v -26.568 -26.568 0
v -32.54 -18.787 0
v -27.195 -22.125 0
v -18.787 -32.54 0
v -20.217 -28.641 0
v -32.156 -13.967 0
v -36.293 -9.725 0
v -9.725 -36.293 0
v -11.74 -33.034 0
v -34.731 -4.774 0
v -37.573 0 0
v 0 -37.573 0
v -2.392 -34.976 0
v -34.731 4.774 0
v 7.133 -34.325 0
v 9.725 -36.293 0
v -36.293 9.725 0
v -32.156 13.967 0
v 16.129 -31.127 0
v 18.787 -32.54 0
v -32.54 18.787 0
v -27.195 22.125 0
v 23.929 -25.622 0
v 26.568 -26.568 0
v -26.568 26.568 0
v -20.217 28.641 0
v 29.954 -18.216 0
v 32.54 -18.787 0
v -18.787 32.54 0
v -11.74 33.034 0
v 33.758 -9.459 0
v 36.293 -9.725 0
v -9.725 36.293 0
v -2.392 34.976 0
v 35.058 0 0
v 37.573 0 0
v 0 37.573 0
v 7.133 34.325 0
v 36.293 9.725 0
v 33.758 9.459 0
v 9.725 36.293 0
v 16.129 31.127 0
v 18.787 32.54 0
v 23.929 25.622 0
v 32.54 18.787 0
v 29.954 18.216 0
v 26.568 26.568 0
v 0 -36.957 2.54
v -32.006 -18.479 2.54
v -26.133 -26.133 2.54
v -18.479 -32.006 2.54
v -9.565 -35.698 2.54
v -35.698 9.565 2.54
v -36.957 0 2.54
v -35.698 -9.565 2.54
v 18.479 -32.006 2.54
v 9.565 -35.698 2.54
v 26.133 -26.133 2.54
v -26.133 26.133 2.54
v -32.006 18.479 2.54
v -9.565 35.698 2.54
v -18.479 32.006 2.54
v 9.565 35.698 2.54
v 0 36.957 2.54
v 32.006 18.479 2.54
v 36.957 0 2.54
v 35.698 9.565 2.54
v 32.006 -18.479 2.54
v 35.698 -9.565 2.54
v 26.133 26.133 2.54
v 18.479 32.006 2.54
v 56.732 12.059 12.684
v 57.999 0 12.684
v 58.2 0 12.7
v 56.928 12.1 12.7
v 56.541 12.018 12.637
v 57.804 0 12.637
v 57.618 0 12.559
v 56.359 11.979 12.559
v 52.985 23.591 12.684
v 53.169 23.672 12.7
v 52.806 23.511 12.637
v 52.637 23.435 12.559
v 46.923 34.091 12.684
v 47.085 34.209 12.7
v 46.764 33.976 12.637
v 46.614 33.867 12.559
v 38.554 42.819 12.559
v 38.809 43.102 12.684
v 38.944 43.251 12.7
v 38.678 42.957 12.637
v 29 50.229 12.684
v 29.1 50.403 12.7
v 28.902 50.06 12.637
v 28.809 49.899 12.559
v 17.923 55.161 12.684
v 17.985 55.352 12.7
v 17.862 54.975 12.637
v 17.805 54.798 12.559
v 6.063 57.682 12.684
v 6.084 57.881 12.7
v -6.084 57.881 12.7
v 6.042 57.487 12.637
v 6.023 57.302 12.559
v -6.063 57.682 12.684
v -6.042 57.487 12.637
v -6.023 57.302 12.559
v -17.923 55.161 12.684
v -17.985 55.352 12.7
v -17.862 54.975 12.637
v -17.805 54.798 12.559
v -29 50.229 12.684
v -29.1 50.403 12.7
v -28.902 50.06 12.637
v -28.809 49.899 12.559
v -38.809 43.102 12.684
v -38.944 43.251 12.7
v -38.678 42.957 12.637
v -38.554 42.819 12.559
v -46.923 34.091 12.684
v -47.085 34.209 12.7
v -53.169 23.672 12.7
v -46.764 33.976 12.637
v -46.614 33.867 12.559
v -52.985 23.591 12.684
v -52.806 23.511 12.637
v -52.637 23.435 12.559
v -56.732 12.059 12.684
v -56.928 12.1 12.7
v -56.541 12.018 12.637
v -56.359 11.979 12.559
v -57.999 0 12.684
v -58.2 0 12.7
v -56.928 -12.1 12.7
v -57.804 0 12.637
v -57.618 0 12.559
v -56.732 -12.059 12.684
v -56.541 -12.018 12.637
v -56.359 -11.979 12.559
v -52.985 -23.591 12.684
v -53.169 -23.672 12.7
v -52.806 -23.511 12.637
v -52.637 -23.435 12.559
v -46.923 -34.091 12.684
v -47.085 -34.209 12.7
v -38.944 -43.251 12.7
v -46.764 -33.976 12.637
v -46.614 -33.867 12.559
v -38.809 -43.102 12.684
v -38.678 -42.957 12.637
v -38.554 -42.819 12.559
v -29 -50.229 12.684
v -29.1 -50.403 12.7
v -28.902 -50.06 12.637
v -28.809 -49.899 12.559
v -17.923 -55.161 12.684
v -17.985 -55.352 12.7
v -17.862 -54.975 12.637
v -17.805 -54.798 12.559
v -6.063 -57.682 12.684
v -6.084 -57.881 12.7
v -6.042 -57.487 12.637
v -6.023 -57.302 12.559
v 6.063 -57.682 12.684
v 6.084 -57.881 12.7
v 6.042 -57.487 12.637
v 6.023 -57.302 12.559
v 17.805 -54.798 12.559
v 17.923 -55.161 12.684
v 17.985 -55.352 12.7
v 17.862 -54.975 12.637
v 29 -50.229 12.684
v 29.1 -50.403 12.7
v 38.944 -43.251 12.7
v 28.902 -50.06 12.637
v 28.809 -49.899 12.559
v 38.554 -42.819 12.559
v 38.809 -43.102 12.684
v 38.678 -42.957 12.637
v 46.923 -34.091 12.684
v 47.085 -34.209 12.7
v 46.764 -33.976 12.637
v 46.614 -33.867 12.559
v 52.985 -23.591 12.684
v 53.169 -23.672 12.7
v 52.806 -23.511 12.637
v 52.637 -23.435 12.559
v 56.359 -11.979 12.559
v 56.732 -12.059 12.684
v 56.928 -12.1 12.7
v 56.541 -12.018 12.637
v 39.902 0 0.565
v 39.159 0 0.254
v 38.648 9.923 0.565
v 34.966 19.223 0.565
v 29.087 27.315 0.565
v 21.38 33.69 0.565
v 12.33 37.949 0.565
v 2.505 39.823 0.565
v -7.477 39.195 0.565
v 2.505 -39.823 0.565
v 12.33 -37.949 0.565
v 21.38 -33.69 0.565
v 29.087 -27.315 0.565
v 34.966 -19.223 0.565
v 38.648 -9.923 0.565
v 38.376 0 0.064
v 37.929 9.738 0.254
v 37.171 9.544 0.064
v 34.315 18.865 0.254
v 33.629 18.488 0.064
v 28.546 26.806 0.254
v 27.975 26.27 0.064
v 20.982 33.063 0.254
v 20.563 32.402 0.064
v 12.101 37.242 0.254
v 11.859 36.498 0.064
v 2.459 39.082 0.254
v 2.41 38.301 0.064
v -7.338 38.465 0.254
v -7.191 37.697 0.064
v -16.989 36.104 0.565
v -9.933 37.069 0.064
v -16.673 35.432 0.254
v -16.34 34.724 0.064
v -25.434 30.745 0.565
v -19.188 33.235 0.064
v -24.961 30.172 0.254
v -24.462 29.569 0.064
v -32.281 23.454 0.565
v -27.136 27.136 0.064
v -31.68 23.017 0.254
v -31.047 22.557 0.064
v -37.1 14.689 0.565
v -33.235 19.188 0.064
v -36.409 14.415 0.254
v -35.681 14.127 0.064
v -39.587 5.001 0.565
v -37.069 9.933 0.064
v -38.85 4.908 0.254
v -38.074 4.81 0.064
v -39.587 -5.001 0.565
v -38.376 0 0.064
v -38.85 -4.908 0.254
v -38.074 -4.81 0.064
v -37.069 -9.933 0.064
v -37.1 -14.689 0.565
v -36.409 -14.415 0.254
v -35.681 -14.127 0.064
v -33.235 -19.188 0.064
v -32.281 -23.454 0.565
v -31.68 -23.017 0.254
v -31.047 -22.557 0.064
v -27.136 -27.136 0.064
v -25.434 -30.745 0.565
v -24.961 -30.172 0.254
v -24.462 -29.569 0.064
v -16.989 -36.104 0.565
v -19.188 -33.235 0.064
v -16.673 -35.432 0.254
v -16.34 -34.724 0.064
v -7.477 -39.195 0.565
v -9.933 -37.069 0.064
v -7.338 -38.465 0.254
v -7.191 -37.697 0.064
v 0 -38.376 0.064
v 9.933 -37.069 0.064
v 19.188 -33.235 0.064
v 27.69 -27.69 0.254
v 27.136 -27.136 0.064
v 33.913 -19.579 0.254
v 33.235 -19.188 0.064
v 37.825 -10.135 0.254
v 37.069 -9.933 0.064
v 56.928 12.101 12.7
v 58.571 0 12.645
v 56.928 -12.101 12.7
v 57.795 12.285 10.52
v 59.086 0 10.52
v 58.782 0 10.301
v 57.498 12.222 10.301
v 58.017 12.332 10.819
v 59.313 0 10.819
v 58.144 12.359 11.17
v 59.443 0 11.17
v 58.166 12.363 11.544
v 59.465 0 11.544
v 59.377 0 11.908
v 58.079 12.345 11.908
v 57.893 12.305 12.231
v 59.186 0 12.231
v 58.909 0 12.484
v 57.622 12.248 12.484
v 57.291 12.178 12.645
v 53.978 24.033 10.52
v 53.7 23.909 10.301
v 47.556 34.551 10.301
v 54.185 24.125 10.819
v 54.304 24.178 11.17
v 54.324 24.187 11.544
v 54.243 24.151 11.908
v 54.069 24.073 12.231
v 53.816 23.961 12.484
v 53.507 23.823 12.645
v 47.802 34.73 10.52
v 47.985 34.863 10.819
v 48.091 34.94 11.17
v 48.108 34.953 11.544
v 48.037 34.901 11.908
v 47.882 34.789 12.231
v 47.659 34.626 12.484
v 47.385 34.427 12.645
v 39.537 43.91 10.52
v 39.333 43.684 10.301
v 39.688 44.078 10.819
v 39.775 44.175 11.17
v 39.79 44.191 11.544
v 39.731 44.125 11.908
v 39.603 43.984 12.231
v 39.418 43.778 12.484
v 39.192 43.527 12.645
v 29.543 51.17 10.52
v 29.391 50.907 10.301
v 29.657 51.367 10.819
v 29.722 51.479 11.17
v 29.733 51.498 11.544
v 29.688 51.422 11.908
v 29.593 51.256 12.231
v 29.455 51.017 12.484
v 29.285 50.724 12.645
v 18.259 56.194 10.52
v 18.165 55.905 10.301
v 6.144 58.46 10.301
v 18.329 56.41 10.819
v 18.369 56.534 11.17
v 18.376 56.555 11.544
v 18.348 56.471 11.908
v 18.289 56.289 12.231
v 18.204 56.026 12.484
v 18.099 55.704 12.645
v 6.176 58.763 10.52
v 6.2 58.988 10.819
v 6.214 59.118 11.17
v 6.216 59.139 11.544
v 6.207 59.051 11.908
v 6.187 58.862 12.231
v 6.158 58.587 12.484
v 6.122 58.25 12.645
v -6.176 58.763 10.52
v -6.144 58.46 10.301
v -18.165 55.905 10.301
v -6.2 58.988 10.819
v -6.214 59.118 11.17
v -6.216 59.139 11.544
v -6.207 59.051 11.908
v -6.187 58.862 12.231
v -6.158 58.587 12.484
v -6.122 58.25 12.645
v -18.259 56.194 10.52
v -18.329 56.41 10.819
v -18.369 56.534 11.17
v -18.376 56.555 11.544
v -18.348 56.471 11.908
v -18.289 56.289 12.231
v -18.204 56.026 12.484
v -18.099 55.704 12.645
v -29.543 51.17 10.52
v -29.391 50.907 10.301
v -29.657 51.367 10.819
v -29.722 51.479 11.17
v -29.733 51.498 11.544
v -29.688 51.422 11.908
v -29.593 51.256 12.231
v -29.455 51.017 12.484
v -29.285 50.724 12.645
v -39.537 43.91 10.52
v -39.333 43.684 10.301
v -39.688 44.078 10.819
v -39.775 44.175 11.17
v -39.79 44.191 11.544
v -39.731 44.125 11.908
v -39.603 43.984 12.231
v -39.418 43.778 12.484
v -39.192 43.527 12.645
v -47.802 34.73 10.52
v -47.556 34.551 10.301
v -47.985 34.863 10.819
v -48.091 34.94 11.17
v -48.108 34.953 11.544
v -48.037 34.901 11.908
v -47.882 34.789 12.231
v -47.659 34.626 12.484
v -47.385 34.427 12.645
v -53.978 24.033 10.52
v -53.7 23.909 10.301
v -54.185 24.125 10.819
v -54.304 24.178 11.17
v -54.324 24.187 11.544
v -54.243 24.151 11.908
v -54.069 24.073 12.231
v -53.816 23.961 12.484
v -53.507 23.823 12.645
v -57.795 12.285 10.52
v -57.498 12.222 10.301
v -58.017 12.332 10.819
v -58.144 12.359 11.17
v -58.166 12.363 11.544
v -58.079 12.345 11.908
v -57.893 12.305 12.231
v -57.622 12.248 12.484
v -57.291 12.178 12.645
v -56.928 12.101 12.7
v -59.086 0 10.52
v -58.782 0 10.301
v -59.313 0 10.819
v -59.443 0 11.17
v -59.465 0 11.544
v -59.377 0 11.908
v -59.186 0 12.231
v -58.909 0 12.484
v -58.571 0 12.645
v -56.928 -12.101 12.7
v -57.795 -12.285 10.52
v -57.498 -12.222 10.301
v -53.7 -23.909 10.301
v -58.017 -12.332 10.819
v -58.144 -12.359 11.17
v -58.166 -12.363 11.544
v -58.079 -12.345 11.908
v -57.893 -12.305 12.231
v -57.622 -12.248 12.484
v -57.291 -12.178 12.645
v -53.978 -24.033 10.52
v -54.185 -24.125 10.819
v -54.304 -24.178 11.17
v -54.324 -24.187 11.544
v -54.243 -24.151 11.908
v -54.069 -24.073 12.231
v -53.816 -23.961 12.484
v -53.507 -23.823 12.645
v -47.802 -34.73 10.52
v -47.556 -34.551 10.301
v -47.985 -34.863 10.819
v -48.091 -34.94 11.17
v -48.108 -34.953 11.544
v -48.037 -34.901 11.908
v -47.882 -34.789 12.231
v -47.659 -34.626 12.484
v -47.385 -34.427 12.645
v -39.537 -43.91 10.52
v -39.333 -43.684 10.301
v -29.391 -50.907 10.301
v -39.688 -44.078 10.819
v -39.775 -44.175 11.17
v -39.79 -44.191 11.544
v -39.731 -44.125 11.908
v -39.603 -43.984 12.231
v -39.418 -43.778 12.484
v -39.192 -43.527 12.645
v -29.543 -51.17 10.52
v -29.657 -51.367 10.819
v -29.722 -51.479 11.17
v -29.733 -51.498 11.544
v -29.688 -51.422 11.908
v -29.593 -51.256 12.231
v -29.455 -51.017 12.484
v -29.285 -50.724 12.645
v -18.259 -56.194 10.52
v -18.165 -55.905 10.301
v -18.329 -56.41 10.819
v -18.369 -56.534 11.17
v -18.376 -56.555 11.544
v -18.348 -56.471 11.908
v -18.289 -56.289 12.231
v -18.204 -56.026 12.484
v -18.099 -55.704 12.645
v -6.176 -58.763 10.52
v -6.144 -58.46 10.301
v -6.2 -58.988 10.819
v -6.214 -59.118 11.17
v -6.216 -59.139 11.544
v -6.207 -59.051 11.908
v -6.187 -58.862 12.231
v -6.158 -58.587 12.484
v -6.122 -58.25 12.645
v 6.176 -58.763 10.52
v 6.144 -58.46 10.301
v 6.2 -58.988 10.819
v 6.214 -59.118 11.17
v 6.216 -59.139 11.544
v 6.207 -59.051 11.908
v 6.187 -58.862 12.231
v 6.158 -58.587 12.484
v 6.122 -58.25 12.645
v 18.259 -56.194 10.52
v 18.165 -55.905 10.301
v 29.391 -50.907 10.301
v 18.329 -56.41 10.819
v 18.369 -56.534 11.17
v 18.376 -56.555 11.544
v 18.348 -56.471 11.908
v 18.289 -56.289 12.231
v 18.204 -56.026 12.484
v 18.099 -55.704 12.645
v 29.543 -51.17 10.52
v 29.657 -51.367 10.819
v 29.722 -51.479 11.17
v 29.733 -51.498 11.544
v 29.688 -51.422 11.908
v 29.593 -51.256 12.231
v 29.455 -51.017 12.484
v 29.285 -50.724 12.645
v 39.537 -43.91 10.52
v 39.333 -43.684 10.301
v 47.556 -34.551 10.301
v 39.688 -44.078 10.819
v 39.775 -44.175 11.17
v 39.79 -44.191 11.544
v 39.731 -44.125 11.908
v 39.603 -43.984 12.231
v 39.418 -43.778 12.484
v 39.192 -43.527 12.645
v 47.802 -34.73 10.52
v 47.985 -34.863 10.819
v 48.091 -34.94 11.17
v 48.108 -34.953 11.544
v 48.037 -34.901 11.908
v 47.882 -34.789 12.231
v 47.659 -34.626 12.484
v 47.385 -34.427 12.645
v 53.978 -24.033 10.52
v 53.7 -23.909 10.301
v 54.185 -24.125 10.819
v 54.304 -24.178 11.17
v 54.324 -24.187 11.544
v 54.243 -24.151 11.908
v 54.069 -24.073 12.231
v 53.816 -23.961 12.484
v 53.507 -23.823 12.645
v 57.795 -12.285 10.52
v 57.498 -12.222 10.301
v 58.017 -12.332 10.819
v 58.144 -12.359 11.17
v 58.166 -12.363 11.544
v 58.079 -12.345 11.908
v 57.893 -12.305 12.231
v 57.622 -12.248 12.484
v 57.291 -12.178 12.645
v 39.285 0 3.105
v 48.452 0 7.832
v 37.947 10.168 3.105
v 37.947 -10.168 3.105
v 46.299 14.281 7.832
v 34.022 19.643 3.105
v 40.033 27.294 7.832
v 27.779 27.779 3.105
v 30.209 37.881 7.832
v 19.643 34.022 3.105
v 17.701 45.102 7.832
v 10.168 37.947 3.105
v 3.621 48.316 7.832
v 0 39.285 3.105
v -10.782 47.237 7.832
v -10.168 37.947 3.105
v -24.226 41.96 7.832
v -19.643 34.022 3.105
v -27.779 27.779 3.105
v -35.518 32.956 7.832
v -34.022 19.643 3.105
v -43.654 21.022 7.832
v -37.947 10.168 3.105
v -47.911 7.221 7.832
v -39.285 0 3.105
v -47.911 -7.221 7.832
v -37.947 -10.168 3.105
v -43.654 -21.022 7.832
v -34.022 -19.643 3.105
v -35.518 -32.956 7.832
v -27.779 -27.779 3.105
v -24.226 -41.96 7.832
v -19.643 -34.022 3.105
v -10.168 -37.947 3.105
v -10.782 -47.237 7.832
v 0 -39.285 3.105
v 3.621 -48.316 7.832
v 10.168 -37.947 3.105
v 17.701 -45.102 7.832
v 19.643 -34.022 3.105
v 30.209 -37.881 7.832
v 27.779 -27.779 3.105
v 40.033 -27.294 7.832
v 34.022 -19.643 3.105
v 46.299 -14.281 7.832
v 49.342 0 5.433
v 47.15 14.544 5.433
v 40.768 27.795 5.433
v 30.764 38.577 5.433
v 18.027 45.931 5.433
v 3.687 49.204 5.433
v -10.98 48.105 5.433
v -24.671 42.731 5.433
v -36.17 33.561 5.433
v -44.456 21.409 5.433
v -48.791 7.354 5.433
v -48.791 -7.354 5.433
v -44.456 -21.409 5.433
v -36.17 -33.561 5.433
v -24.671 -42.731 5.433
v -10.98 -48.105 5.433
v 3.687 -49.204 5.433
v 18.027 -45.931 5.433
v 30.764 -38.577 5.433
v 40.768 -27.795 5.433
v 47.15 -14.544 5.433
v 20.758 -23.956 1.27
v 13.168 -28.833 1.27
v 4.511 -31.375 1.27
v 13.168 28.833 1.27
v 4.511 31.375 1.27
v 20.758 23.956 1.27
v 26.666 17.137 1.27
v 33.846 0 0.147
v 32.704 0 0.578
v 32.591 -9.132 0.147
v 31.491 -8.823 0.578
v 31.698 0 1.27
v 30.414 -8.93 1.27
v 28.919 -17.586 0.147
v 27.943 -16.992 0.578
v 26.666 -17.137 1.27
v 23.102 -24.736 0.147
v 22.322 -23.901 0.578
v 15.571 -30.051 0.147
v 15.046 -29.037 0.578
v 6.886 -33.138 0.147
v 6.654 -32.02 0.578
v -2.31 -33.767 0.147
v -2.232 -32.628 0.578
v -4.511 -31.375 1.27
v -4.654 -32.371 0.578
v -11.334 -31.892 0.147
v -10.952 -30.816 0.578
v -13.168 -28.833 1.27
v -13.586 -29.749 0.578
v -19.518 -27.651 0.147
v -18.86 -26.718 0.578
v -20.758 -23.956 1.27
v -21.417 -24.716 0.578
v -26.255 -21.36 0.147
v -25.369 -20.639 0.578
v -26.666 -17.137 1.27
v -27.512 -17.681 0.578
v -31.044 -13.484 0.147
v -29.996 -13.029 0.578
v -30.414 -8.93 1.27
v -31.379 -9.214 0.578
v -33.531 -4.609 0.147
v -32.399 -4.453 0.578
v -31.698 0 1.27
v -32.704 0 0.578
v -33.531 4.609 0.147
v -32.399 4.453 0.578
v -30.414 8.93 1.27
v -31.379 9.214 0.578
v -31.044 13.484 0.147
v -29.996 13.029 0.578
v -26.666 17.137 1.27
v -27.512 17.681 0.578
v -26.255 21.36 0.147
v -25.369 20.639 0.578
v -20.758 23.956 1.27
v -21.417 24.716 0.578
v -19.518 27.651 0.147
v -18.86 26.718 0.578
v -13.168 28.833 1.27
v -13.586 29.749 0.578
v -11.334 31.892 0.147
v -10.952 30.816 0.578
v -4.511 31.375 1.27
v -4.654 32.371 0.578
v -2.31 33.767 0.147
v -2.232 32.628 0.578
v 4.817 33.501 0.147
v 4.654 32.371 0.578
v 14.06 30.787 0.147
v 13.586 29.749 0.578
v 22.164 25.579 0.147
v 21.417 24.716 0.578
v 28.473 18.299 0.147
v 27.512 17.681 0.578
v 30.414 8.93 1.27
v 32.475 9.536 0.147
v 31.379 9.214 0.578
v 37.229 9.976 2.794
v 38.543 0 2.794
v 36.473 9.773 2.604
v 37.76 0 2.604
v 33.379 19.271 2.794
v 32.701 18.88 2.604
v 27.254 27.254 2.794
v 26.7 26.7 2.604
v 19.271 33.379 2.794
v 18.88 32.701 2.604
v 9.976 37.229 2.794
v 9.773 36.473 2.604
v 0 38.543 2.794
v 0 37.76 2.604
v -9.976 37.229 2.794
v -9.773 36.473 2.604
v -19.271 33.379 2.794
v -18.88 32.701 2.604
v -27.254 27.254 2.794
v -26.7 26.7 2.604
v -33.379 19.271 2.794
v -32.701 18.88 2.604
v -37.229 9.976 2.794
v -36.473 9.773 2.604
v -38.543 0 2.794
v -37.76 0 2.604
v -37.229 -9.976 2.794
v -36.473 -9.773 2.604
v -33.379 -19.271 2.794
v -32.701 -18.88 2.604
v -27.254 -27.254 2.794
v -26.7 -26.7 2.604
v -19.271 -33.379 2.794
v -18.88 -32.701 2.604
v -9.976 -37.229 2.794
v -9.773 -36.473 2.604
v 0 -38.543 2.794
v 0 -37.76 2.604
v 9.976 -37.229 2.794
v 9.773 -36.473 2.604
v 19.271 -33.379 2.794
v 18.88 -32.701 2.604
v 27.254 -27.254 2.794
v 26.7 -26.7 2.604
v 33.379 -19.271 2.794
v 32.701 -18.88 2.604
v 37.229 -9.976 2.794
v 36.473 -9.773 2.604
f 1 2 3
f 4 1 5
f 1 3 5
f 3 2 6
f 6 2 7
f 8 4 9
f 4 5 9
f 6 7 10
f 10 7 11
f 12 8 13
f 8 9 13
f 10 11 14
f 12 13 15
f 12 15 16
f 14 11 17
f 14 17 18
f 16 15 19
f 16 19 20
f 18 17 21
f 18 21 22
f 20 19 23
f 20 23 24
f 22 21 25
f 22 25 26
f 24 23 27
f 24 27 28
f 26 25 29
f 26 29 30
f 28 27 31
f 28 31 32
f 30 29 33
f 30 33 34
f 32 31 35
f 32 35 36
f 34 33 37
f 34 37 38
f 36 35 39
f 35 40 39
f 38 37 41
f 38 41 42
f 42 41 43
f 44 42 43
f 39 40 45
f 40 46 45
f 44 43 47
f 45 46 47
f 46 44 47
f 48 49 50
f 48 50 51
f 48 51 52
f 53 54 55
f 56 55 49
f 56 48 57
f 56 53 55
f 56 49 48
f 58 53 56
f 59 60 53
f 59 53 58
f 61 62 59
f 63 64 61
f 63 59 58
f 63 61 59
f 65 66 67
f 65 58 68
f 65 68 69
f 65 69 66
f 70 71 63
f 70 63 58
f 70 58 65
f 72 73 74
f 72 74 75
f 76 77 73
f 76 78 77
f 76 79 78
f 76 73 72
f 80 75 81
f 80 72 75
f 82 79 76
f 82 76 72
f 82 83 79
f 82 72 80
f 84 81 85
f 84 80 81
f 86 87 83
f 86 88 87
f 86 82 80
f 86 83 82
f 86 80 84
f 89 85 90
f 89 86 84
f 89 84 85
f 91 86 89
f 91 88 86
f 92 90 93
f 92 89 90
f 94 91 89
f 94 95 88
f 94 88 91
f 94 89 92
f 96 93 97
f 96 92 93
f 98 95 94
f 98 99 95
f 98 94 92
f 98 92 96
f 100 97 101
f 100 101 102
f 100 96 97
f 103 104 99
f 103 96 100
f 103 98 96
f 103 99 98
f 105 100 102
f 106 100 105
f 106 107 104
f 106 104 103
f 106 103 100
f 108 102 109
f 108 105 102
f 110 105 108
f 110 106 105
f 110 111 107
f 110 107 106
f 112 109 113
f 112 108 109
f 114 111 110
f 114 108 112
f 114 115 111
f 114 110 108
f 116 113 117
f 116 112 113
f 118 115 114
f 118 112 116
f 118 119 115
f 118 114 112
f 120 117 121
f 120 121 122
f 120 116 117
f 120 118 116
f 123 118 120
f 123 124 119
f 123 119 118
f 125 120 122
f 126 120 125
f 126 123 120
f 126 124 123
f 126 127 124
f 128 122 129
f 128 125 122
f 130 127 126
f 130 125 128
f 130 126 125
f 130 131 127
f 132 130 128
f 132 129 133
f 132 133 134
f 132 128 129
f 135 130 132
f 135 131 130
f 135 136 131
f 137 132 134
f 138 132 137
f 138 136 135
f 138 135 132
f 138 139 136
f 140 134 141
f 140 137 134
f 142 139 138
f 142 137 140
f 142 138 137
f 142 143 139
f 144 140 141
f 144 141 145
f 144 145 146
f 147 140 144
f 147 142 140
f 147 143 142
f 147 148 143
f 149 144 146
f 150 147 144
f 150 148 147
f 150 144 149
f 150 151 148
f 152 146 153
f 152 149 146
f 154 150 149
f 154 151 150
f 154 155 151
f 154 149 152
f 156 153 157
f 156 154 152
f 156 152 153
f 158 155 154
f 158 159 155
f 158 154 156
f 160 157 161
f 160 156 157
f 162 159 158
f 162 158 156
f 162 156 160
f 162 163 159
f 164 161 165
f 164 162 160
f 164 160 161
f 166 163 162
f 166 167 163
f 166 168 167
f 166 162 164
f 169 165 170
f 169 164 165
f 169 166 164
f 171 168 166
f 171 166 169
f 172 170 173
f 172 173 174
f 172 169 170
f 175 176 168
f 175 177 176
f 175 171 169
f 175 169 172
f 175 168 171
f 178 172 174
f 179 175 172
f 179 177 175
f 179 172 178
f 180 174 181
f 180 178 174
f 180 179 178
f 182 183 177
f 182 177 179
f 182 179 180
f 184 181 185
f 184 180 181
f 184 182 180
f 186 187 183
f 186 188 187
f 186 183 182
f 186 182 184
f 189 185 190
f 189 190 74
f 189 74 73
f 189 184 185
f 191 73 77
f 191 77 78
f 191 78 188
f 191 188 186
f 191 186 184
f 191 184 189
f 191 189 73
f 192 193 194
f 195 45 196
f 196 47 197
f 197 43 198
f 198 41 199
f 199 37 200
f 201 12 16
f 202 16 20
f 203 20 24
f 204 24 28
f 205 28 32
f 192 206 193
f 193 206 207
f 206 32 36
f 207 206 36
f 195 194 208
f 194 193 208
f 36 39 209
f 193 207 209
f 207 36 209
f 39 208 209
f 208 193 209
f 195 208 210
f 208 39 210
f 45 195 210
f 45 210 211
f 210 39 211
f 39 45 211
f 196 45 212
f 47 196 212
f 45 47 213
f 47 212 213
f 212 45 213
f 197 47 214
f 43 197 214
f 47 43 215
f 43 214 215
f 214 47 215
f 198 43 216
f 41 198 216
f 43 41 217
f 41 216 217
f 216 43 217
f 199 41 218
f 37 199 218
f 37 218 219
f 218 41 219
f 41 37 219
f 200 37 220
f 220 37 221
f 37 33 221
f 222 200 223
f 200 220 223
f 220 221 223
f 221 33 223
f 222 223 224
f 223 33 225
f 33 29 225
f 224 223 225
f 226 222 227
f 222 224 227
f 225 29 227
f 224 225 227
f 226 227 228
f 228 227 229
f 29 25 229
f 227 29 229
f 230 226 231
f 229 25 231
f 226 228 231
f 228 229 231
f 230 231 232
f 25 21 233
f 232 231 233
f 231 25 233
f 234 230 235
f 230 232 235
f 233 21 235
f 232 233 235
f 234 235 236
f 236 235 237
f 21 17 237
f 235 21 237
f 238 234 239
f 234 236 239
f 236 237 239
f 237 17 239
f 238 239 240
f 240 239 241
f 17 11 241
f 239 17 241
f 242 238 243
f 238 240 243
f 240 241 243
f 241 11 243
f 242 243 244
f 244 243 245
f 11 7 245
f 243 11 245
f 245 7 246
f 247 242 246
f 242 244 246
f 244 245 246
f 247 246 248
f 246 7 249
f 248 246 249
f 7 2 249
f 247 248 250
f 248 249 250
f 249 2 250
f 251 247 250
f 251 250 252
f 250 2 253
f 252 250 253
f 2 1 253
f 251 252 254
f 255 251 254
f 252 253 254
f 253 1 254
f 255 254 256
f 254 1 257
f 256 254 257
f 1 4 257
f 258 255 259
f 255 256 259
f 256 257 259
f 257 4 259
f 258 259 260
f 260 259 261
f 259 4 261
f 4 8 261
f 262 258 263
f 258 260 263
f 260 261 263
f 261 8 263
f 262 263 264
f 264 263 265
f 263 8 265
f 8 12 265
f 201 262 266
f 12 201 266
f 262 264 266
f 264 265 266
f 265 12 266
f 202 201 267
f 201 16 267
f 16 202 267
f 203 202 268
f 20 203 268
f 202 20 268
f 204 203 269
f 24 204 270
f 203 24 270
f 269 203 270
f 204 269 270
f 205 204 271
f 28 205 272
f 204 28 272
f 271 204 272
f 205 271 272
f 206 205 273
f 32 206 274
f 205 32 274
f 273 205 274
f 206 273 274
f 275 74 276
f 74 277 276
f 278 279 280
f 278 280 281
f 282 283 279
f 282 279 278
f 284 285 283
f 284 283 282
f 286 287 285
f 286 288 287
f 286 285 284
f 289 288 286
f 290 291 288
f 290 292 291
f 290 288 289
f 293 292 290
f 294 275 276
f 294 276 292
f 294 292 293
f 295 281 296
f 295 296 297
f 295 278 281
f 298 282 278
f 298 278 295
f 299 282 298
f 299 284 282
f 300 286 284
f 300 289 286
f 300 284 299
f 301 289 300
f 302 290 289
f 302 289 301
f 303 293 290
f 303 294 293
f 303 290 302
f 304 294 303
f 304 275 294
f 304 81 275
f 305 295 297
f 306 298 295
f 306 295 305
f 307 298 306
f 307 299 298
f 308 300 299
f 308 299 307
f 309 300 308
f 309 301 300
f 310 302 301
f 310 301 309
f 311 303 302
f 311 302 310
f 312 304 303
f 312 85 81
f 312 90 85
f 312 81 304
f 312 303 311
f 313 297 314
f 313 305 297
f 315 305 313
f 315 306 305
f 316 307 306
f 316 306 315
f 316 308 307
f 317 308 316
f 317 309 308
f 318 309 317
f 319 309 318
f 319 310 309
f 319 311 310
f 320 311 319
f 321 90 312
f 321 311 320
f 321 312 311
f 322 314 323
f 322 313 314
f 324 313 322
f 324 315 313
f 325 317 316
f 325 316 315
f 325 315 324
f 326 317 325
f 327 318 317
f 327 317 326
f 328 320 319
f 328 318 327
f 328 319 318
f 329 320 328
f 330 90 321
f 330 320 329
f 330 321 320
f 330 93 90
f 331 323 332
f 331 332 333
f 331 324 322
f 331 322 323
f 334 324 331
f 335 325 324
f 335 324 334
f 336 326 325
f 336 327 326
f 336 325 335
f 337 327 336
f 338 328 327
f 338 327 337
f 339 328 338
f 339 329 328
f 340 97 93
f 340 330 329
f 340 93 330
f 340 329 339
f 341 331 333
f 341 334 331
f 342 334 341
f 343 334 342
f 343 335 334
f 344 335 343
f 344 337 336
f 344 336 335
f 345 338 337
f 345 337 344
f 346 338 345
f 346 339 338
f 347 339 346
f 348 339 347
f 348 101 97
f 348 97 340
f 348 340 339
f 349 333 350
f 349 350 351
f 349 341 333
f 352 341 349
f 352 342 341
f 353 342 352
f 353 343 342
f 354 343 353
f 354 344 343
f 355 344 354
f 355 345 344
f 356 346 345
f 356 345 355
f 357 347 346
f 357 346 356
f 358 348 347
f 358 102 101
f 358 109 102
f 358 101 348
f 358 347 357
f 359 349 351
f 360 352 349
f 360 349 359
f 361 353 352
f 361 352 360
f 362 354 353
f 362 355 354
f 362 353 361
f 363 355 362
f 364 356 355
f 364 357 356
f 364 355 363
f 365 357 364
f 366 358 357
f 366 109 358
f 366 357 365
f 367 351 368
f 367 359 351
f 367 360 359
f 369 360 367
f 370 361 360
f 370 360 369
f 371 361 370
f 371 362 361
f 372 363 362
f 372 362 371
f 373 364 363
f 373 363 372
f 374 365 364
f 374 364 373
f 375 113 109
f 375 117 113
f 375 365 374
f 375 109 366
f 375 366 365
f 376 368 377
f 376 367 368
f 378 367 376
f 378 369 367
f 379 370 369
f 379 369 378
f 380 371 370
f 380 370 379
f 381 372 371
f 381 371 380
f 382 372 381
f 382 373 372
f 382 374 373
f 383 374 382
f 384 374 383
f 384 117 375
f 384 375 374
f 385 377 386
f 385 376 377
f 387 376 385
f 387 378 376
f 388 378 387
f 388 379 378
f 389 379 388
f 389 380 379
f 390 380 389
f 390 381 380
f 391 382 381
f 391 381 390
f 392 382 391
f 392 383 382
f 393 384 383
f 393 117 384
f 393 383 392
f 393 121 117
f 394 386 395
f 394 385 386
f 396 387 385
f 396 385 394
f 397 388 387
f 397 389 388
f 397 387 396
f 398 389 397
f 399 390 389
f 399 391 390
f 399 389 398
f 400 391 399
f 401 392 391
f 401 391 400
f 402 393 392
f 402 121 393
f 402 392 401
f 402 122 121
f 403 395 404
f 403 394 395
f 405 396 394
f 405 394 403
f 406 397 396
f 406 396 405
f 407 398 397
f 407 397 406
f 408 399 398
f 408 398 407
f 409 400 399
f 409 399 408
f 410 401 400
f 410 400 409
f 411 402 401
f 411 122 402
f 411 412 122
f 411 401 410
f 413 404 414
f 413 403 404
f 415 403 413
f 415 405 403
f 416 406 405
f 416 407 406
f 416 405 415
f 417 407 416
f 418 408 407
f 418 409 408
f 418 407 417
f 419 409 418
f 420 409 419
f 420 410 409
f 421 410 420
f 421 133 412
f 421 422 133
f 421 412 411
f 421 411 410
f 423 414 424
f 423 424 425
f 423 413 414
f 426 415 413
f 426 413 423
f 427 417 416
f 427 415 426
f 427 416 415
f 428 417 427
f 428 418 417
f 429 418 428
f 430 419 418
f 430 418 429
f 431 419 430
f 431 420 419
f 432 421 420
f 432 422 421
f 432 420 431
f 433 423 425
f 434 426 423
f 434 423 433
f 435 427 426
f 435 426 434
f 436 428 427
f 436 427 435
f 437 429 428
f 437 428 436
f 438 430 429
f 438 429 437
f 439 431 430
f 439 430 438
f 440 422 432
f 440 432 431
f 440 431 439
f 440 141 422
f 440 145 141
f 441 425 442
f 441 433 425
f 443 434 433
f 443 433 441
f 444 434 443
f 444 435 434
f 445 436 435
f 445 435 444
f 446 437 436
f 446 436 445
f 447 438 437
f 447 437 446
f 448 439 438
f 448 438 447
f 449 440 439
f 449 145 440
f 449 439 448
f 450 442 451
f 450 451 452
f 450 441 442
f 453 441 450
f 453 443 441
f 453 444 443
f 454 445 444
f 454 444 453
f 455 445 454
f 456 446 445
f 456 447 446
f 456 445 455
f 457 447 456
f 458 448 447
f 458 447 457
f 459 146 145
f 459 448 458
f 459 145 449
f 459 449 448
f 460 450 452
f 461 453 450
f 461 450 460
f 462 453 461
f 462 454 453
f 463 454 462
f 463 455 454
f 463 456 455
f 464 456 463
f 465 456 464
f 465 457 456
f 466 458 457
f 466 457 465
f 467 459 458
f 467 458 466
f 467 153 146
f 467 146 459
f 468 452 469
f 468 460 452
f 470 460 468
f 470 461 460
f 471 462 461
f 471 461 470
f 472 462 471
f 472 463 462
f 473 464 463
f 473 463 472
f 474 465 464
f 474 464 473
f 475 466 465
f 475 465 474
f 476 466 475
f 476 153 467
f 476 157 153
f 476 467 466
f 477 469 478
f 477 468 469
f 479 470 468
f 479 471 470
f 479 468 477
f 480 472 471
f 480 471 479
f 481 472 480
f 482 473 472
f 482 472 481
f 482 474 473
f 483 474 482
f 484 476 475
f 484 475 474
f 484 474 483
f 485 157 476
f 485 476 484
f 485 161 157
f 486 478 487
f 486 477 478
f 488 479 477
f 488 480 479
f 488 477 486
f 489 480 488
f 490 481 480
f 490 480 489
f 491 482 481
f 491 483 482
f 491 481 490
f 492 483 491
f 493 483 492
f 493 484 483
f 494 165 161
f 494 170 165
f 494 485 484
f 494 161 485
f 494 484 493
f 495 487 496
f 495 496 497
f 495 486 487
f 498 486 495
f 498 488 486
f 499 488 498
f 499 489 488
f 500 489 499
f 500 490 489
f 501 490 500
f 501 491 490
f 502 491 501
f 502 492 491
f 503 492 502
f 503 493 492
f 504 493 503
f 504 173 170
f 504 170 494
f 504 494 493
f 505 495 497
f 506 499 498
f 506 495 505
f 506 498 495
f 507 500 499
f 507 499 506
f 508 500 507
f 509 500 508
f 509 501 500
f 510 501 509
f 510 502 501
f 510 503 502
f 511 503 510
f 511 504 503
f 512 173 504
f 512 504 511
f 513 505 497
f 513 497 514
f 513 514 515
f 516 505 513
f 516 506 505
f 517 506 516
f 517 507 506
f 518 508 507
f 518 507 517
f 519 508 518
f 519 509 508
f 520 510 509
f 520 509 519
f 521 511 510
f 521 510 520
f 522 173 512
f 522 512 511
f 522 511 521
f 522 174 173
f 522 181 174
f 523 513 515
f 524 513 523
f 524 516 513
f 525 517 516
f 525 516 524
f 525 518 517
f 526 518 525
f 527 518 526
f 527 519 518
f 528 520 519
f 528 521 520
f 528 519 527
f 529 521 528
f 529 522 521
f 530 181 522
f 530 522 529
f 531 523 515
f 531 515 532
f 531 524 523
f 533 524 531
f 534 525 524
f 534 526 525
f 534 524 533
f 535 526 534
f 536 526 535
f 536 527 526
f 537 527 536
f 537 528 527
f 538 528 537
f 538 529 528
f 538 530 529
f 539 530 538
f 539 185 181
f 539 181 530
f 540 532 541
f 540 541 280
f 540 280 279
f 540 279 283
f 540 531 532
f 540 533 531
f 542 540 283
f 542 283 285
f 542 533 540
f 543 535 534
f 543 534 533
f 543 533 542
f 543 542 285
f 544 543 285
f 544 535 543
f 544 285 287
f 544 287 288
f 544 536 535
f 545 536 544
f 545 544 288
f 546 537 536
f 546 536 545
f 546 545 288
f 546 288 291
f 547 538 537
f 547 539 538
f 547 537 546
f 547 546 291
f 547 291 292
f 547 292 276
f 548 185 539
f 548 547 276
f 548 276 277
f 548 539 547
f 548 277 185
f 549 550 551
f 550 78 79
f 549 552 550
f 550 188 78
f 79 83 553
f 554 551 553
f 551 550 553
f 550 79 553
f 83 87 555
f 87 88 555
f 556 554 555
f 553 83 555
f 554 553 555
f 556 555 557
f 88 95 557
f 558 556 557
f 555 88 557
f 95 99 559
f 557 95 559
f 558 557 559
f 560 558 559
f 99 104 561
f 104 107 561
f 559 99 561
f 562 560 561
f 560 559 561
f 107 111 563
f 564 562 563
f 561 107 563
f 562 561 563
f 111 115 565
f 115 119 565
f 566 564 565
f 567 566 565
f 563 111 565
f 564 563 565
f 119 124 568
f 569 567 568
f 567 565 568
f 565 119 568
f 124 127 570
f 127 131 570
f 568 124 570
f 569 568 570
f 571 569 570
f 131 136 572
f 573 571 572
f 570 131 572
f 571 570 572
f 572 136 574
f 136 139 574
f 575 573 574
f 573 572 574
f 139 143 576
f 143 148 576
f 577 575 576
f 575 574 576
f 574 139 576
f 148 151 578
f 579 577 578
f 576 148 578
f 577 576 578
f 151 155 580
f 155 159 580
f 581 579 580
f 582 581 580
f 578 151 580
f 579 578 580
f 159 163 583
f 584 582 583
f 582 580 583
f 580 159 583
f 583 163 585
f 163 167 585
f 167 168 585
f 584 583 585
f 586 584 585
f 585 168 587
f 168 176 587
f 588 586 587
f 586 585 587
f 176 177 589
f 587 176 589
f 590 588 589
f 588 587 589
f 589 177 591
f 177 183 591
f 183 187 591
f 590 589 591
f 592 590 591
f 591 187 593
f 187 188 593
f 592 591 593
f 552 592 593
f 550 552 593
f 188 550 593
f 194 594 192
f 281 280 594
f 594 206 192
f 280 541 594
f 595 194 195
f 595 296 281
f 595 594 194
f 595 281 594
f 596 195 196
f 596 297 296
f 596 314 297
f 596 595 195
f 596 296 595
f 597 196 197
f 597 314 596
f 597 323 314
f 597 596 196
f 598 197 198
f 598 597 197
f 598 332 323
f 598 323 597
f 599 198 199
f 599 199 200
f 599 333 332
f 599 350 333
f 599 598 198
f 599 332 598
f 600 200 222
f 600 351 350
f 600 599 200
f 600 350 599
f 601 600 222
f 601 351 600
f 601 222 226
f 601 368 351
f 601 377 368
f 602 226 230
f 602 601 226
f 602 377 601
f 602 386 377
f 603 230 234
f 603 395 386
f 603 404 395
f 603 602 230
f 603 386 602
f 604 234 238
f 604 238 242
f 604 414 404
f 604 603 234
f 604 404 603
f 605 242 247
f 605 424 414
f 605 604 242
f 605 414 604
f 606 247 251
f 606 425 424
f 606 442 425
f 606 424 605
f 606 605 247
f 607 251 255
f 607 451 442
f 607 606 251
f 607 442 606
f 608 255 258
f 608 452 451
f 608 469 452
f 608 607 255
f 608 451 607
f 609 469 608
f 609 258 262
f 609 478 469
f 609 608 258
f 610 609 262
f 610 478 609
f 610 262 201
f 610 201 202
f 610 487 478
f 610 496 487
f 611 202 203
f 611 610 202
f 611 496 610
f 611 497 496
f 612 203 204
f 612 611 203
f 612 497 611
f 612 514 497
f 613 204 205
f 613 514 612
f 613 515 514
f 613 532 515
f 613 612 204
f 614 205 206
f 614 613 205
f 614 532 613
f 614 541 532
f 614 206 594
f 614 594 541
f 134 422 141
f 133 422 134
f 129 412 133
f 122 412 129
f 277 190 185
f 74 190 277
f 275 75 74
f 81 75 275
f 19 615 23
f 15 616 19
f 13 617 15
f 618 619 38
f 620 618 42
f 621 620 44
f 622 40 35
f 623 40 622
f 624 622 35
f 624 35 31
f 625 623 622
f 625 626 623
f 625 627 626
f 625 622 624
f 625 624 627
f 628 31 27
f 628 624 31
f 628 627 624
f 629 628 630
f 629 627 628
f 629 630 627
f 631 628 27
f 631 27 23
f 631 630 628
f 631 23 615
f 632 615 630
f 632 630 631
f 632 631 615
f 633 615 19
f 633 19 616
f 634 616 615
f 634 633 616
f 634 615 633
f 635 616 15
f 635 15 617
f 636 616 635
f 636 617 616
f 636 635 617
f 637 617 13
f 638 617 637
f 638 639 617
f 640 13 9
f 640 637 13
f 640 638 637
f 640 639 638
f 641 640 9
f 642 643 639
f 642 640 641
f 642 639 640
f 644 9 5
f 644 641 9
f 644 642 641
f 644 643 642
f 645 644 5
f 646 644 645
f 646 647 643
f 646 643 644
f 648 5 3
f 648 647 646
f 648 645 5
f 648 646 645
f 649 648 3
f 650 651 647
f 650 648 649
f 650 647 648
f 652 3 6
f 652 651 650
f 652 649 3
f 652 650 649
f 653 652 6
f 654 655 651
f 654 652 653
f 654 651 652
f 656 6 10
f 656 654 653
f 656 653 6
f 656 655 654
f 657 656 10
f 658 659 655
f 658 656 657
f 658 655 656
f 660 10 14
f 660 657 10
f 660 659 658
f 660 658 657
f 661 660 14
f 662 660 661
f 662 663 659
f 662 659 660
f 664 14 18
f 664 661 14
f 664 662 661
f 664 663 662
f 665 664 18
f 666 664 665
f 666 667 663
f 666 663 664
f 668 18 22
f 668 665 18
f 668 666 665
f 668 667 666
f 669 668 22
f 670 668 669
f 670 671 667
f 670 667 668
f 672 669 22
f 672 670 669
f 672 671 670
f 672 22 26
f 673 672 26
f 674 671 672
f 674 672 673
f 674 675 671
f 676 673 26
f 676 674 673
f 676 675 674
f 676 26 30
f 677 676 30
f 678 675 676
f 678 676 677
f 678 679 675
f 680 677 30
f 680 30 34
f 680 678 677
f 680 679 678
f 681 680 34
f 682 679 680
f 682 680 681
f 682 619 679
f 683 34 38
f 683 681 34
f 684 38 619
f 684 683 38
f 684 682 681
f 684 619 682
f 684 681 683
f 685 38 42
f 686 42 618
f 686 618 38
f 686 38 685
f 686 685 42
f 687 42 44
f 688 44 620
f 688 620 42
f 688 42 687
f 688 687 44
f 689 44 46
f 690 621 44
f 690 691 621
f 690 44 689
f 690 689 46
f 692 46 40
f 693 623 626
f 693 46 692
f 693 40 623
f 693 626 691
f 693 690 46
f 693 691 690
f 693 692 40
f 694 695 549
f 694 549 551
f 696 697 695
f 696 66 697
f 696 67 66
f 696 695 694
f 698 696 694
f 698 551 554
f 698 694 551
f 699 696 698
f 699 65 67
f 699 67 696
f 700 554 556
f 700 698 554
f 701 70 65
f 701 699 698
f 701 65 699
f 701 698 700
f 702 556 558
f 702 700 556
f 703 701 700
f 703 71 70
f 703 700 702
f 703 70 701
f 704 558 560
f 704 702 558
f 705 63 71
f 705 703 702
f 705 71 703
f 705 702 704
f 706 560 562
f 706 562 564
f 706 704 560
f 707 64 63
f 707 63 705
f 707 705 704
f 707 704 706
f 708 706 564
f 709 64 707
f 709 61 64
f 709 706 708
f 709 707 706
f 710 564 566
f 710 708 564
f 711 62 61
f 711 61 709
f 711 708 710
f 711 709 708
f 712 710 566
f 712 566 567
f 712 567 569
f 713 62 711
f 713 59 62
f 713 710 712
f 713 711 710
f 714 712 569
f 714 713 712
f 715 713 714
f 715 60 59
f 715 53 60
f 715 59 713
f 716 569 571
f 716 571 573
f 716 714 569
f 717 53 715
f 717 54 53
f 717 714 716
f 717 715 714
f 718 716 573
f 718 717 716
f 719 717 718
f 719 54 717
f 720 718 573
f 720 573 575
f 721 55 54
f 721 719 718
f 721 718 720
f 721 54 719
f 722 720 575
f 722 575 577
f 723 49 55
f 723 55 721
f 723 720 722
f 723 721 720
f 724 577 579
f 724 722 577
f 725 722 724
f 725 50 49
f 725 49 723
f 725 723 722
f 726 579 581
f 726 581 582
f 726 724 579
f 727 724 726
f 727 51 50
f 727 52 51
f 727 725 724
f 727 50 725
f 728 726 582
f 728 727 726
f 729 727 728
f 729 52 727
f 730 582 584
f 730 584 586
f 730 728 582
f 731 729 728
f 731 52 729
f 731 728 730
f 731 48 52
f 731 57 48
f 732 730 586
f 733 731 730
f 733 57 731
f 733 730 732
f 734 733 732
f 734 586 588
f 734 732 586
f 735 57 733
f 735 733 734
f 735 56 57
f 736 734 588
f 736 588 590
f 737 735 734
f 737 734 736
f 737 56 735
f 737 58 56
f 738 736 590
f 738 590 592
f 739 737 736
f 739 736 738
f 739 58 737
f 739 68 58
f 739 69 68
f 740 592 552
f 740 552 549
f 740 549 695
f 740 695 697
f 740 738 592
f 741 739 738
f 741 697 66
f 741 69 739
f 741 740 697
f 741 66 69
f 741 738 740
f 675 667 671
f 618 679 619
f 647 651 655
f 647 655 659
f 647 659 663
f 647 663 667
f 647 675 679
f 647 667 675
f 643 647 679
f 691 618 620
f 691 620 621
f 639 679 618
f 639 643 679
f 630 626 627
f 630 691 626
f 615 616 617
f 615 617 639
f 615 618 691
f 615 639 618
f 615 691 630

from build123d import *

# Parameters (mm, degrees)
F0_R     = 38.8061370384
F2_R     = 63.433920718
F4_T     = -2.54
F5_R     = 1.26999
F6_R     = 31.6978703438
F7_DEPTH = 1.27
F9_R     = 5.08


# Not quite as in the source:
# - a fillet or chamfer that OpenCascade refuses, or shapes differently, is made with other operations: its cross-section is extruded or revolved along the edge and cut away or added
# - a fillet or chamfer is up to 0.001 mm smaller than in the source, because OpenCascade refuses the exact size


with BuildPart() as f3:
    # F0 (on Top) → F3 section 0
    with BuildSketch(Plane.XY):
        Circle(F0_R)
    # F2 (on offset) → F3 section 1
    with BuildSketch(Plane.XY.offset(12.7)):
        Circle(F2_R)
    loft()

    # F4
    f4_openings = [f3.faces().sort_by_distance(p)[0] for p in [
        (0, 0, 12.7),
    ]]
    offset(amount=F4_T, openings=f4_openings, kind=Kind.INTERSECTION)

    # F5 (radius 1.27 in the source; OpenCascade refuses exactly that, so slightly less here)
    f5_edges = [f3.edges().sort_by_distance(p)[0] for p in [
        (-63.433921, 0, 12.7),
        (-57.892016, 0, 12.7),
    ]]
    fillet(f5_edges, radius=F5_R)

    # F6 (on face) → F7 (cut)
    with BuildSketch(Plane(origin=(0, 0, 0), x_dir=(1, 0, 0), z_dir=(0, 0, -1))):
        Circle(F6_R)
    extrude(amount=-F7_DEPTH, mode=Mode.SUBTRACT)

    # F8: fillet of radius 5.08 on 2 edges, made by hand

    # F8_s1 → F8_t2 (revolve, cut)
    with BuildSketch(Plane.XZ):
        with BuildLine():
            ThreePointArc((35.0579745088, 0), (33.2619232846, 0.3280951188), (31.6978703438, 1.27))
            Line((31.6978703438, 1.27), (31.6978703438, 0))
            Line((31.6978703438, 0), (35.0579745088, 0))
        make_face()
    revolve(axis=Axis((0, 0, 0), (0, 0, -1)), mode=Mode.SUBTRACT)

    # F8_s3 → F8_t4 (revolve, cut)
    with BuildSketch(Plane.XZ):
        with BuildLine():
            ThreePointArc((39.9017377768, 0.5649769203), (38.7713729734, 0.1432643759), (37.5734408477, 0))
            Line((37.5734408477, 0), (38.8061370384, 0))
            Line((38.8061370384, 0), (39.9017377768, 0.5649769203))
        make_face()
    revolve(axis=Axis((0, 0, 0), (0, 0, 1)), mode=Mode.SUBTRACT)

    # F9
    f9_edges = [f3.edges().sort_by_distance(p)[0] for p in [
        (-38.189789, 0, 2.54),
    ]]
    fillet(f9_edges, radius=F9_R)


solid = f3.part
